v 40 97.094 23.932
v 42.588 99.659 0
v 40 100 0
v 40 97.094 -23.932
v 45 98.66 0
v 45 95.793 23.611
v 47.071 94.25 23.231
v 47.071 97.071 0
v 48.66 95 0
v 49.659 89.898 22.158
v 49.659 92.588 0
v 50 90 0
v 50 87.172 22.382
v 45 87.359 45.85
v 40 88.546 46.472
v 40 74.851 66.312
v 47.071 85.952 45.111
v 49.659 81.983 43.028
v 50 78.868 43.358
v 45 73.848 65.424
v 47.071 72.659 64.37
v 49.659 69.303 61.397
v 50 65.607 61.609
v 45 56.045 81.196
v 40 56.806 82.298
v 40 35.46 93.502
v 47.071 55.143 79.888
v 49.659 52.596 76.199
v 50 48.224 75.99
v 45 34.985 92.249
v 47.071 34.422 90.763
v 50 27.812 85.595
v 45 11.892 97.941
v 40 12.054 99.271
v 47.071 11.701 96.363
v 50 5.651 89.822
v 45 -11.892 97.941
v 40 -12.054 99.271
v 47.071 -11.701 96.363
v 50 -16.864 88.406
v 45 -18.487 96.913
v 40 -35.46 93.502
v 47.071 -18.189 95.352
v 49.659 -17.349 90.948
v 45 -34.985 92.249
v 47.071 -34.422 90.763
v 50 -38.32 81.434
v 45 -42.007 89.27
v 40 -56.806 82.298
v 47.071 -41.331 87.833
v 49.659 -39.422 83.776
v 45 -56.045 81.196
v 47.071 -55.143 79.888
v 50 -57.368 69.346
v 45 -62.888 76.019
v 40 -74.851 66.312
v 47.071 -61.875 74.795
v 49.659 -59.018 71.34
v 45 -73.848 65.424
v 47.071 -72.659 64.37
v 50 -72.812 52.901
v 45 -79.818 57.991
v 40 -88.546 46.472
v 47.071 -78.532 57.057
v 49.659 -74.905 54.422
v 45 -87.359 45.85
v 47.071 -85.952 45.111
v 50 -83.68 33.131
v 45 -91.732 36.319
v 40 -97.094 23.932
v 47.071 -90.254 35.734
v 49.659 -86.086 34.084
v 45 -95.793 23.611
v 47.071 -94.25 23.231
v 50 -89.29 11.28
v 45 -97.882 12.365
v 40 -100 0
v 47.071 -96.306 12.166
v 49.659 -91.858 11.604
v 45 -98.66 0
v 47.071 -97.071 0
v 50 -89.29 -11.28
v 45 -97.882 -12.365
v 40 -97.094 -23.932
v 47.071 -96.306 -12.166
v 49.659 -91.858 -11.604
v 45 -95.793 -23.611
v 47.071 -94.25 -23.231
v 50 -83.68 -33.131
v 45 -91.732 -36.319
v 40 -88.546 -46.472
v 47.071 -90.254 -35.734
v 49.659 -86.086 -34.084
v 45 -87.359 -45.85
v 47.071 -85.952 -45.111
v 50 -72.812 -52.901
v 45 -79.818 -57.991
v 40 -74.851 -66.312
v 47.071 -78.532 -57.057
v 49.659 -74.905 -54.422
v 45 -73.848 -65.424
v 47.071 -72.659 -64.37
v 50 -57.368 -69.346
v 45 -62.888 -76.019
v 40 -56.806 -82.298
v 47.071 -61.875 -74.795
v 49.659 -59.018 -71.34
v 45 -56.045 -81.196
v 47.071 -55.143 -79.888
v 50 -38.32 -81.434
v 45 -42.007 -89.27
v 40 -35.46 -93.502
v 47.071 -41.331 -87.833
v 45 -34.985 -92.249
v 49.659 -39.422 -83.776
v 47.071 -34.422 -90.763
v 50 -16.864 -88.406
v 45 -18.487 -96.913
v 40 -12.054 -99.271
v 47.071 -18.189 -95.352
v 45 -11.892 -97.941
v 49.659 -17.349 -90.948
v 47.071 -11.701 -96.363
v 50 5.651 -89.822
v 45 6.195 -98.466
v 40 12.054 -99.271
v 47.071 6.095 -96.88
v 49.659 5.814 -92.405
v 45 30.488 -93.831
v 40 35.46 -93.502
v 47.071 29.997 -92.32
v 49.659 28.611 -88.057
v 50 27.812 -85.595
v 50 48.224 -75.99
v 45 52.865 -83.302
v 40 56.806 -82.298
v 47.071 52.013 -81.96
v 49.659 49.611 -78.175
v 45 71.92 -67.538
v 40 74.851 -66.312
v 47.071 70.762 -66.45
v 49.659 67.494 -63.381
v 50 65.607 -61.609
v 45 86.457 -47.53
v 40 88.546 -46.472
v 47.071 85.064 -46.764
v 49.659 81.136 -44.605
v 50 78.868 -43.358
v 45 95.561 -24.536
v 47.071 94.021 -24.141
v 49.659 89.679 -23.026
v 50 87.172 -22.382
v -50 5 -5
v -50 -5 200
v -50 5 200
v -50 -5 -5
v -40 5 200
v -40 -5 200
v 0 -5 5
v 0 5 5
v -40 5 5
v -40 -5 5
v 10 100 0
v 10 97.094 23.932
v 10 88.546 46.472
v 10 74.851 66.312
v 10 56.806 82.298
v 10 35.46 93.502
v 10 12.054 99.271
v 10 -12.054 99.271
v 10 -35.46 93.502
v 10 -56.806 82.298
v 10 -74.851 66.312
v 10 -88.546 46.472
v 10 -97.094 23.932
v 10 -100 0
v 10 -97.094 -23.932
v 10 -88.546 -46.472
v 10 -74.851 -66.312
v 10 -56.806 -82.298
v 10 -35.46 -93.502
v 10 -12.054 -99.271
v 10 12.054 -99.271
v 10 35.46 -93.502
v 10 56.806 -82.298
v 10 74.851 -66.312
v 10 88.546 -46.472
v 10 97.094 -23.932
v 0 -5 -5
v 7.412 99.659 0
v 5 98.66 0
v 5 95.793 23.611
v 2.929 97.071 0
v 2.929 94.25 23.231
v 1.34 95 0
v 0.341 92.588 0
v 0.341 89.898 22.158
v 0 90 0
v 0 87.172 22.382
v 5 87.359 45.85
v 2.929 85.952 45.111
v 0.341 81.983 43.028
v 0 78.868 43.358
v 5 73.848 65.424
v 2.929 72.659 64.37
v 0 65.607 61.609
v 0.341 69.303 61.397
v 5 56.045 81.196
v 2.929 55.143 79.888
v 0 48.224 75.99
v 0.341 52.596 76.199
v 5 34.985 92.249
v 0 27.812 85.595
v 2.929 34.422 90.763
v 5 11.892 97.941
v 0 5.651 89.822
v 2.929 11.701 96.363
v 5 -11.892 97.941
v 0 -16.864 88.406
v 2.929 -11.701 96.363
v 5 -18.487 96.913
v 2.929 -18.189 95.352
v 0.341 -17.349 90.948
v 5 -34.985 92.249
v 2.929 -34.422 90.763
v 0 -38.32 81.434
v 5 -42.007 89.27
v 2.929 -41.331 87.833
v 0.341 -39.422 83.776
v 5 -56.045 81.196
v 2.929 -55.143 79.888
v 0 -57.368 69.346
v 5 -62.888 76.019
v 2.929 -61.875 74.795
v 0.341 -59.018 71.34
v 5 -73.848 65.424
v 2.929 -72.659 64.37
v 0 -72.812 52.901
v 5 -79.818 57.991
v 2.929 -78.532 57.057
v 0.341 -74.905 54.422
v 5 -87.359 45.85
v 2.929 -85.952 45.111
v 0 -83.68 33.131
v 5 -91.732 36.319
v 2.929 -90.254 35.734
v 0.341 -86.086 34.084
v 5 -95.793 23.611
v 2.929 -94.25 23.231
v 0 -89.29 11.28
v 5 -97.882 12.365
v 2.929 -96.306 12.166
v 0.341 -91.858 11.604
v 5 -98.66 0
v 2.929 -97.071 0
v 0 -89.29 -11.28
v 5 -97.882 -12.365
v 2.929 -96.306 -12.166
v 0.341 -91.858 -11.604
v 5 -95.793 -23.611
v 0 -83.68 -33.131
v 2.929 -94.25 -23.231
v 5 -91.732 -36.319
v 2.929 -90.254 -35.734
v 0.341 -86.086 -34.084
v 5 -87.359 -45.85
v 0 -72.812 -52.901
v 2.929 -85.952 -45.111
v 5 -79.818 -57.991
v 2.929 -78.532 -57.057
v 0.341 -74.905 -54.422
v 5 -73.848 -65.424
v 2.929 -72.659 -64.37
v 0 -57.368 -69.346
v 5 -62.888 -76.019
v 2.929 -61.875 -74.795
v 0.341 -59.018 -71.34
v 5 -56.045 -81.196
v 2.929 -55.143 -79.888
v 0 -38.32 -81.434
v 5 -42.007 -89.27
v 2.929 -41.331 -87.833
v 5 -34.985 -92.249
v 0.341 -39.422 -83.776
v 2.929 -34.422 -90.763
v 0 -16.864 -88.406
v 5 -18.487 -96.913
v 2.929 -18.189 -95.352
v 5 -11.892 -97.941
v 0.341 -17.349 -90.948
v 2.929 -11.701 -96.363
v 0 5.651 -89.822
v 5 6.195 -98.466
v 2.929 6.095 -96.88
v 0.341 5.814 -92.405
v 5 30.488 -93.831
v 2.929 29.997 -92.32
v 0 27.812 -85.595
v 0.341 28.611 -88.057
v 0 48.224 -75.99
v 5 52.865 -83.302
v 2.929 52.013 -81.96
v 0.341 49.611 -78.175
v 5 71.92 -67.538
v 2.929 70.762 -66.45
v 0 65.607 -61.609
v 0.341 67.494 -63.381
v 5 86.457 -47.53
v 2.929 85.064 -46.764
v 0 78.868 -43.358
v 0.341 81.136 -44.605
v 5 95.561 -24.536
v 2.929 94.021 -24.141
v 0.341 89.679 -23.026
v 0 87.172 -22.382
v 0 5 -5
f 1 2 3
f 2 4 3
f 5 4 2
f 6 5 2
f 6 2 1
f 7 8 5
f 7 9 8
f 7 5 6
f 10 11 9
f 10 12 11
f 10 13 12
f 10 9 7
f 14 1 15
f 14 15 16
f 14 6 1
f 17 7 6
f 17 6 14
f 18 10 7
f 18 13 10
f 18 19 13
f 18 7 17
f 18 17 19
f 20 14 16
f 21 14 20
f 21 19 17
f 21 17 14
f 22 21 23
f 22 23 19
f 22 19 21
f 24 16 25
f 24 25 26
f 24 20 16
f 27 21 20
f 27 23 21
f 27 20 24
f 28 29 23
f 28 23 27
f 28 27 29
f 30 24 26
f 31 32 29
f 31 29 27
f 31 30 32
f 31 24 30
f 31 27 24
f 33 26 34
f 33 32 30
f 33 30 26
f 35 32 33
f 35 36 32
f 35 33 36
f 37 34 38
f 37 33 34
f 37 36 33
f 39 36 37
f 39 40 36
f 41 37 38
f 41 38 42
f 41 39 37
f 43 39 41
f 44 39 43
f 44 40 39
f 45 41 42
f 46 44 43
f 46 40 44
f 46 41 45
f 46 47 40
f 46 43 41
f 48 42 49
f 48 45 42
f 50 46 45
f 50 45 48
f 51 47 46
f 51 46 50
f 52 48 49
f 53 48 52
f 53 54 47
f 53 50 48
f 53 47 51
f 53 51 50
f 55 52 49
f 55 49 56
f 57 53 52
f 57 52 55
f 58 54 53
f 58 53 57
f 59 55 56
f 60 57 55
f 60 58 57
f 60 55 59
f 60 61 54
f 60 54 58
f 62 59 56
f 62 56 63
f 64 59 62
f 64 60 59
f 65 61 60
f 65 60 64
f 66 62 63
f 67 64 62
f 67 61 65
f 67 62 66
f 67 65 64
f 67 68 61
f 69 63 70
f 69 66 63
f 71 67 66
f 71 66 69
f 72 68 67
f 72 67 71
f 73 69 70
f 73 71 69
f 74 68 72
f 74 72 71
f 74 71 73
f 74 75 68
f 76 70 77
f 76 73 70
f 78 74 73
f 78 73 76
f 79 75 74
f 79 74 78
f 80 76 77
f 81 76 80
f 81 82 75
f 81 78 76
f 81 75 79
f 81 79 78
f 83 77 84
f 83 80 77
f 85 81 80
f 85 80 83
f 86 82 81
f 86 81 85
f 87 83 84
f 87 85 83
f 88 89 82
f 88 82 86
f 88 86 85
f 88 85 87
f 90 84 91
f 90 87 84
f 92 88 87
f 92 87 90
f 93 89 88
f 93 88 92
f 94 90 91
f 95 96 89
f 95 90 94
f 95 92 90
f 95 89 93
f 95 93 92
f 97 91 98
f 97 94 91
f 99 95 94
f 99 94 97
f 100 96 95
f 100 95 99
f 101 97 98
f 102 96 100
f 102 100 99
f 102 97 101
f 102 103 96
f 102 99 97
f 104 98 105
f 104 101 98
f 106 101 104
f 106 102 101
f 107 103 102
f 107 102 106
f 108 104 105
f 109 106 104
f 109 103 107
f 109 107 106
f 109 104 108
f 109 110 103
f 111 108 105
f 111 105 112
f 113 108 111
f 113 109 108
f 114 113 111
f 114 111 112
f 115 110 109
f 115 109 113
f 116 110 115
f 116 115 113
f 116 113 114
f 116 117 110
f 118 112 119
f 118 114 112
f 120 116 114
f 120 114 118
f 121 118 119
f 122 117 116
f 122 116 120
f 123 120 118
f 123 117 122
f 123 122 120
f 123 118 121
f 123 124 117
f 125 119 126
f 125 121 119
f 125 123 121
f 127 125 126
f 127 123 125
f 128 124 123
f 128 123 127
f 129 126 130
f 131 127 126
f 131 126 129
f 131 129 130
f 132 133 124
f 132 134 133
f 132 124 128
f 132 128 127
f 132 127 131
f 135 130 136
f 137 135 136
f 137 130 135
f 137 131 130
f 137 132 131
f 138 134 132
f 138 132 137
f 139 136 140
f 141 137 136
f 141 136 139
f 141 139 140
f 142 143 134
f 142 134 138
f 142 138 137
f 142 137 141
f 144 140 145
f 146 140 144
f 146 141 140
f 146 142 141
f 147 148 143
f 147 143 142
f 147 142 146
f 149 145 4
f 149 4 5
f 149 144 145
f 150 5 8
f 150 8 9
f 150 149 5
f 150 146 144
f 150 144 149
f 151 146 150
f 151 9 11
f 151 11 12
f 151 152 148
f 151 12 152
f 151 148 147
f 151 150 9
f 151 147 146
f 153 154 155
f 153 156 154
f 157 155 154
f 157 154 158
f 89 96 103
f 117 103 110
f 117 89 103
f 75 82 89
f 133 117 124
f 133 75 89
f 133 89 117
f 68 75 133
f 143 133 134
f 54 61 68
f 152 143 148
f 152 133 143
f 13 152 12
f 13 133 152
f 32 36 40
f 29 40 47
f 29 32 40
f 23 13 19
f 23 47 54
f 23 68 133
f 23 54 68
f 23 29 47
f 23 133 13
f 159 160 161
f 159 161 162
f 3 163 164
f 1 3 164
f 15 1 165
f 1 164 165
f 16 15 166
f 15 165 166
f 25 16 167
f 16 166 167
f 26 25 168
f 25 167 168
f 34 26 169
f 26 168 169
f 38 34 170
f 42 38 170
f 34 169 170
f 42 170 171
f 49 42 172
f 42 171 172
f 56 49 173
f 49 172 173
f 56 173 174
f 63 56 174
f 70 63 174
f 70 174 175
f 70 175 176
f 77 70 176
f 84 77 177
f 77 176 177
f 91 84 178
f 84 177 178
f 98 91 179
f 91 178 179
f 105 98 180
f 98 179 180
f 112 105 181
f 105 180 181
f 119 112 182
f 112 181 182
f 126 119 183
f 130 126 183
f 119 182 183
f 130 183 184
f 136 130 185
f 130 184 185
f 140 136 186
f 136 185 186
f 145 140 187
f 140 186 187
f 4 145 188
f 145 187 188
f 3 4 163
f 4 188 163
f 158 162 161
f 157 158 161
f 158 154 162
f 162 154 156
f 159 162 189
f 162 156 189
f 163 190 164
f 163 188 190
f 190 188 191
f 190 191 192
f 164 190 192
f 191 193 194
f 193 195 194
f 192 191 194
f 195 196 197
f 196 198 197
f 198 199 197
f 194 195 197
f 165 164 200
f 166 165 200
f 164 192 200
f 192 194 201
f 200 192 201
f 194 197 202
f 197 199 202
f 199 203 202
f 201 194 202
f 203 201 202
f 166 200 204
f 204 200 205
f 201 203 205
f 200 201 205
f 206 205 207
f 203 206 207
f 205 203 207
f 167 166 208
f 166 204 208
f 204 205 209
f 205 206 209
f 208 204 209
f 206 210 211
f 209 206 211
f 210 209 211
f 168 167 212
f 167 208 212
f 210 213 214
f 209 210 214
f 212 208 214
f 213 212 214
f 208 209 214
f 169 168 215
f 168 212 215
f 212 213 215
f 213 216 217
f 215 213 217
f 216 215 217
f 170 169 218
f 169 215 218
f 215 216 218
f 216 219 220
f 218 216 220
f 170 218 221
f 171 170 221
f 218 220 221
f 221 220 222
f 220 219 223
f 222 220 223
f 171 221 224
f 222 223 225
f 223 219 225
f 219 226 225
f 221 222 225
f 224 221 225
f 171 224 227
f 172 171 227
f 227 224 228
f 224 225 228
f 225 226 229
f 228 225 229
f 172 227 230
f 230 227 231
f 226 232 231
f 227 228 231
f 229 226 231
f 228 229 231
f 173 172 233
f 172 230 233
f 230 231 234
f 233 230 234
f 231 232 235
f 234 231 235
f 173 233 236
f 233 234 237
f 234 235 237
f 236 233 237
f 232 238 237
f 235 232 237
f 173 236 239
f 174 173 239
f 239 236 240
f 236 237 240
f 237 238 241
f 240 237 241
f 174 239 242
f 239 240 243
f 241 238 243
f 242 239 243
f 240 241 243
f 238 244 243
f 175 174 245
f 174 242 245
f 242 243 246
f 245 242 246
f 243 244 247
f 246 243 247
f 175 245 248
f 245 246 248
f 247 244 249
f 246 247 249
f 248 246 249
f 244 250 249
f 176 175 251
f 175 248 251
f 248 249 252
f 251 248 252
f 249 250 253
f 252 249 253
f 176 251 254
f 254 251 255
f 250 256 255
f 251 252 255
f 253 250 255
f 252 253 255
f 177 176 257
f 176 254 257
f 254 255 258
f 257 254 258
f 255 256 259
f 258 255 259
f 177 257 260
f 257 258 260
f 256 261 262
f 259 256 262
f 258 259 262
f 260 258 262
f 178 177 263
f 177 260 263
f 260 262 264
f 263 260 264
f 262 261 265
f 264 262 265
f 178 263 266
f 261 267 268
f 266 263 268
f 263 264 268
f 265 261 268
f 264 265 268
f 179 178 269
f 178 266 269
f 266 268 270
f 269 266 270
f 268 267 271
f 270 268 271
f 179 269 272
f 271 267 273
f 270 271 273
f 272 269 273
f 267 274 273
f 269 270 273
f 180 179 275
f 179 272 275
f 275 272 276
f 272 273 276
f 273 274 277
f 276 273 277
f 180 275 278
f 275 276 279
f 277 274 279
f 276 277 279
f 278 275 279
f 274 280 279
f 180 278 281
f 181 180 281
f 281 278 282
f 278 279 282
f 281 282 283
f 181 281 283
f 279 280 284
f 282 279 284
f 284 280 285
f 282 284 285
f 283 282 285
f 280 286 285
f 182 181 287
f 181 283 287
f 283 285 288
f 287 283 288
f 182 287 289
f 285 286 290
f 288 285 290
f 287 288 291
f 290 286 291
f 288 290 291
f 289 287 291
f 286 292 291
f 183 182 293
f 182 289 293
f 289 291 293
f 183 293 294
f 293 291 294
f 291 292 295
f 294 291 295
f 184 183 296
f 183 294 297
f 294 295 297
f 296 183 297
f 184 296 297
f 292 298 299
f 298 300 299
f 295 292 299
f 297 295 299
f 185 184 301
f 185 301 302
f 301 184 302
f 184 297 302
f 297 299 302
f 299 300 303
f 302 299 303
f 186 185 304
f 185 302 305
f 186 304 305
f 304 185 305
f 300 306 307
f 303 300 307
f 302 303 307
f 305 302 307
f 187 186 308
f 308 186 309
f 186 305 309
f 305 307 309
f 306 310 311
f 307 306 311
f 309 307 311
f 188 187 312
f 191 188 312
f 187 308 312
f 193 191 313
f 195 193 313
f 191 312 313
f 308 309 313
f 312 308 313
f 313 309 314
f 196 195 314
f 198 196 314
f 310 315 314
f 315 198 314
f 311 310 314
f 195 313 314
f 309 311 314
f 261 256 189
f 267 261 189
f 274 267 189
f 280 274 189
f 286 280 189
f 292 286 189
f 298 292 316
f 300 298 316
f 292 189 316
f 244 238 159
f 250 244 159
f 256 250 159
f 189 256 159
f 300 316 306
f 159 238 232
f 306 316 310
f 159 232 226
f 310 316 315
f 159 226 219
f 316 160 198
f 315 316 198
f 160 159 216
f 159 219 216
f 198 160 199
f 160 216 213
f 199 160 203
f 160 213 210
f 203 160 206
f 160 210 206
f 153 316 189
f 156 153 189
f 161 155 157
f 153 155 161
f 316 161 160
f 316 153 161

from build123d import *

# Parameters (mm, degrees)
F0_R     = 100
F1_DEPTH = 50
F2_R     = 10
F3_W     = 10
F3_H     = 10
F4_DEPTH = 50
F5_W     = 10
F5_H     = 10
F6_DEPTH = 195


with BuildPart() as f1:
    # F0 (on Right) → F1 (new body)
    with BuildSketch(Plane.YZ):
        Circle(F0_R)
    extrude(amount=F1_DEPTH)

    # F2
    f2_edges = [f1.edges().sort_by_distance(p)[0] for p in [
        (50, -100, 0),
        (0, -100, 0),
    ]]
    fillet(f2_edges, radius=F2_R)

    # F3 (on face) → F4 (join)
    with BuildSketch(Plane(origin=(0, 0, 0), x_dir=(0, -1, 0), z_dir=(-1, 0, 0))):
        Rectangle(F3_W, F3_H)
    extrude(amount=F4_DEPTH)

    # F5 (on face) → F6 (join)
    with BuildSketch(Plane.XY.offset(5)):
        with Locations((-45, 0)):
            Rectangle(F5_W, F5_H)
    extrude(amount=F6_DEPTH)


solid = f1.part
